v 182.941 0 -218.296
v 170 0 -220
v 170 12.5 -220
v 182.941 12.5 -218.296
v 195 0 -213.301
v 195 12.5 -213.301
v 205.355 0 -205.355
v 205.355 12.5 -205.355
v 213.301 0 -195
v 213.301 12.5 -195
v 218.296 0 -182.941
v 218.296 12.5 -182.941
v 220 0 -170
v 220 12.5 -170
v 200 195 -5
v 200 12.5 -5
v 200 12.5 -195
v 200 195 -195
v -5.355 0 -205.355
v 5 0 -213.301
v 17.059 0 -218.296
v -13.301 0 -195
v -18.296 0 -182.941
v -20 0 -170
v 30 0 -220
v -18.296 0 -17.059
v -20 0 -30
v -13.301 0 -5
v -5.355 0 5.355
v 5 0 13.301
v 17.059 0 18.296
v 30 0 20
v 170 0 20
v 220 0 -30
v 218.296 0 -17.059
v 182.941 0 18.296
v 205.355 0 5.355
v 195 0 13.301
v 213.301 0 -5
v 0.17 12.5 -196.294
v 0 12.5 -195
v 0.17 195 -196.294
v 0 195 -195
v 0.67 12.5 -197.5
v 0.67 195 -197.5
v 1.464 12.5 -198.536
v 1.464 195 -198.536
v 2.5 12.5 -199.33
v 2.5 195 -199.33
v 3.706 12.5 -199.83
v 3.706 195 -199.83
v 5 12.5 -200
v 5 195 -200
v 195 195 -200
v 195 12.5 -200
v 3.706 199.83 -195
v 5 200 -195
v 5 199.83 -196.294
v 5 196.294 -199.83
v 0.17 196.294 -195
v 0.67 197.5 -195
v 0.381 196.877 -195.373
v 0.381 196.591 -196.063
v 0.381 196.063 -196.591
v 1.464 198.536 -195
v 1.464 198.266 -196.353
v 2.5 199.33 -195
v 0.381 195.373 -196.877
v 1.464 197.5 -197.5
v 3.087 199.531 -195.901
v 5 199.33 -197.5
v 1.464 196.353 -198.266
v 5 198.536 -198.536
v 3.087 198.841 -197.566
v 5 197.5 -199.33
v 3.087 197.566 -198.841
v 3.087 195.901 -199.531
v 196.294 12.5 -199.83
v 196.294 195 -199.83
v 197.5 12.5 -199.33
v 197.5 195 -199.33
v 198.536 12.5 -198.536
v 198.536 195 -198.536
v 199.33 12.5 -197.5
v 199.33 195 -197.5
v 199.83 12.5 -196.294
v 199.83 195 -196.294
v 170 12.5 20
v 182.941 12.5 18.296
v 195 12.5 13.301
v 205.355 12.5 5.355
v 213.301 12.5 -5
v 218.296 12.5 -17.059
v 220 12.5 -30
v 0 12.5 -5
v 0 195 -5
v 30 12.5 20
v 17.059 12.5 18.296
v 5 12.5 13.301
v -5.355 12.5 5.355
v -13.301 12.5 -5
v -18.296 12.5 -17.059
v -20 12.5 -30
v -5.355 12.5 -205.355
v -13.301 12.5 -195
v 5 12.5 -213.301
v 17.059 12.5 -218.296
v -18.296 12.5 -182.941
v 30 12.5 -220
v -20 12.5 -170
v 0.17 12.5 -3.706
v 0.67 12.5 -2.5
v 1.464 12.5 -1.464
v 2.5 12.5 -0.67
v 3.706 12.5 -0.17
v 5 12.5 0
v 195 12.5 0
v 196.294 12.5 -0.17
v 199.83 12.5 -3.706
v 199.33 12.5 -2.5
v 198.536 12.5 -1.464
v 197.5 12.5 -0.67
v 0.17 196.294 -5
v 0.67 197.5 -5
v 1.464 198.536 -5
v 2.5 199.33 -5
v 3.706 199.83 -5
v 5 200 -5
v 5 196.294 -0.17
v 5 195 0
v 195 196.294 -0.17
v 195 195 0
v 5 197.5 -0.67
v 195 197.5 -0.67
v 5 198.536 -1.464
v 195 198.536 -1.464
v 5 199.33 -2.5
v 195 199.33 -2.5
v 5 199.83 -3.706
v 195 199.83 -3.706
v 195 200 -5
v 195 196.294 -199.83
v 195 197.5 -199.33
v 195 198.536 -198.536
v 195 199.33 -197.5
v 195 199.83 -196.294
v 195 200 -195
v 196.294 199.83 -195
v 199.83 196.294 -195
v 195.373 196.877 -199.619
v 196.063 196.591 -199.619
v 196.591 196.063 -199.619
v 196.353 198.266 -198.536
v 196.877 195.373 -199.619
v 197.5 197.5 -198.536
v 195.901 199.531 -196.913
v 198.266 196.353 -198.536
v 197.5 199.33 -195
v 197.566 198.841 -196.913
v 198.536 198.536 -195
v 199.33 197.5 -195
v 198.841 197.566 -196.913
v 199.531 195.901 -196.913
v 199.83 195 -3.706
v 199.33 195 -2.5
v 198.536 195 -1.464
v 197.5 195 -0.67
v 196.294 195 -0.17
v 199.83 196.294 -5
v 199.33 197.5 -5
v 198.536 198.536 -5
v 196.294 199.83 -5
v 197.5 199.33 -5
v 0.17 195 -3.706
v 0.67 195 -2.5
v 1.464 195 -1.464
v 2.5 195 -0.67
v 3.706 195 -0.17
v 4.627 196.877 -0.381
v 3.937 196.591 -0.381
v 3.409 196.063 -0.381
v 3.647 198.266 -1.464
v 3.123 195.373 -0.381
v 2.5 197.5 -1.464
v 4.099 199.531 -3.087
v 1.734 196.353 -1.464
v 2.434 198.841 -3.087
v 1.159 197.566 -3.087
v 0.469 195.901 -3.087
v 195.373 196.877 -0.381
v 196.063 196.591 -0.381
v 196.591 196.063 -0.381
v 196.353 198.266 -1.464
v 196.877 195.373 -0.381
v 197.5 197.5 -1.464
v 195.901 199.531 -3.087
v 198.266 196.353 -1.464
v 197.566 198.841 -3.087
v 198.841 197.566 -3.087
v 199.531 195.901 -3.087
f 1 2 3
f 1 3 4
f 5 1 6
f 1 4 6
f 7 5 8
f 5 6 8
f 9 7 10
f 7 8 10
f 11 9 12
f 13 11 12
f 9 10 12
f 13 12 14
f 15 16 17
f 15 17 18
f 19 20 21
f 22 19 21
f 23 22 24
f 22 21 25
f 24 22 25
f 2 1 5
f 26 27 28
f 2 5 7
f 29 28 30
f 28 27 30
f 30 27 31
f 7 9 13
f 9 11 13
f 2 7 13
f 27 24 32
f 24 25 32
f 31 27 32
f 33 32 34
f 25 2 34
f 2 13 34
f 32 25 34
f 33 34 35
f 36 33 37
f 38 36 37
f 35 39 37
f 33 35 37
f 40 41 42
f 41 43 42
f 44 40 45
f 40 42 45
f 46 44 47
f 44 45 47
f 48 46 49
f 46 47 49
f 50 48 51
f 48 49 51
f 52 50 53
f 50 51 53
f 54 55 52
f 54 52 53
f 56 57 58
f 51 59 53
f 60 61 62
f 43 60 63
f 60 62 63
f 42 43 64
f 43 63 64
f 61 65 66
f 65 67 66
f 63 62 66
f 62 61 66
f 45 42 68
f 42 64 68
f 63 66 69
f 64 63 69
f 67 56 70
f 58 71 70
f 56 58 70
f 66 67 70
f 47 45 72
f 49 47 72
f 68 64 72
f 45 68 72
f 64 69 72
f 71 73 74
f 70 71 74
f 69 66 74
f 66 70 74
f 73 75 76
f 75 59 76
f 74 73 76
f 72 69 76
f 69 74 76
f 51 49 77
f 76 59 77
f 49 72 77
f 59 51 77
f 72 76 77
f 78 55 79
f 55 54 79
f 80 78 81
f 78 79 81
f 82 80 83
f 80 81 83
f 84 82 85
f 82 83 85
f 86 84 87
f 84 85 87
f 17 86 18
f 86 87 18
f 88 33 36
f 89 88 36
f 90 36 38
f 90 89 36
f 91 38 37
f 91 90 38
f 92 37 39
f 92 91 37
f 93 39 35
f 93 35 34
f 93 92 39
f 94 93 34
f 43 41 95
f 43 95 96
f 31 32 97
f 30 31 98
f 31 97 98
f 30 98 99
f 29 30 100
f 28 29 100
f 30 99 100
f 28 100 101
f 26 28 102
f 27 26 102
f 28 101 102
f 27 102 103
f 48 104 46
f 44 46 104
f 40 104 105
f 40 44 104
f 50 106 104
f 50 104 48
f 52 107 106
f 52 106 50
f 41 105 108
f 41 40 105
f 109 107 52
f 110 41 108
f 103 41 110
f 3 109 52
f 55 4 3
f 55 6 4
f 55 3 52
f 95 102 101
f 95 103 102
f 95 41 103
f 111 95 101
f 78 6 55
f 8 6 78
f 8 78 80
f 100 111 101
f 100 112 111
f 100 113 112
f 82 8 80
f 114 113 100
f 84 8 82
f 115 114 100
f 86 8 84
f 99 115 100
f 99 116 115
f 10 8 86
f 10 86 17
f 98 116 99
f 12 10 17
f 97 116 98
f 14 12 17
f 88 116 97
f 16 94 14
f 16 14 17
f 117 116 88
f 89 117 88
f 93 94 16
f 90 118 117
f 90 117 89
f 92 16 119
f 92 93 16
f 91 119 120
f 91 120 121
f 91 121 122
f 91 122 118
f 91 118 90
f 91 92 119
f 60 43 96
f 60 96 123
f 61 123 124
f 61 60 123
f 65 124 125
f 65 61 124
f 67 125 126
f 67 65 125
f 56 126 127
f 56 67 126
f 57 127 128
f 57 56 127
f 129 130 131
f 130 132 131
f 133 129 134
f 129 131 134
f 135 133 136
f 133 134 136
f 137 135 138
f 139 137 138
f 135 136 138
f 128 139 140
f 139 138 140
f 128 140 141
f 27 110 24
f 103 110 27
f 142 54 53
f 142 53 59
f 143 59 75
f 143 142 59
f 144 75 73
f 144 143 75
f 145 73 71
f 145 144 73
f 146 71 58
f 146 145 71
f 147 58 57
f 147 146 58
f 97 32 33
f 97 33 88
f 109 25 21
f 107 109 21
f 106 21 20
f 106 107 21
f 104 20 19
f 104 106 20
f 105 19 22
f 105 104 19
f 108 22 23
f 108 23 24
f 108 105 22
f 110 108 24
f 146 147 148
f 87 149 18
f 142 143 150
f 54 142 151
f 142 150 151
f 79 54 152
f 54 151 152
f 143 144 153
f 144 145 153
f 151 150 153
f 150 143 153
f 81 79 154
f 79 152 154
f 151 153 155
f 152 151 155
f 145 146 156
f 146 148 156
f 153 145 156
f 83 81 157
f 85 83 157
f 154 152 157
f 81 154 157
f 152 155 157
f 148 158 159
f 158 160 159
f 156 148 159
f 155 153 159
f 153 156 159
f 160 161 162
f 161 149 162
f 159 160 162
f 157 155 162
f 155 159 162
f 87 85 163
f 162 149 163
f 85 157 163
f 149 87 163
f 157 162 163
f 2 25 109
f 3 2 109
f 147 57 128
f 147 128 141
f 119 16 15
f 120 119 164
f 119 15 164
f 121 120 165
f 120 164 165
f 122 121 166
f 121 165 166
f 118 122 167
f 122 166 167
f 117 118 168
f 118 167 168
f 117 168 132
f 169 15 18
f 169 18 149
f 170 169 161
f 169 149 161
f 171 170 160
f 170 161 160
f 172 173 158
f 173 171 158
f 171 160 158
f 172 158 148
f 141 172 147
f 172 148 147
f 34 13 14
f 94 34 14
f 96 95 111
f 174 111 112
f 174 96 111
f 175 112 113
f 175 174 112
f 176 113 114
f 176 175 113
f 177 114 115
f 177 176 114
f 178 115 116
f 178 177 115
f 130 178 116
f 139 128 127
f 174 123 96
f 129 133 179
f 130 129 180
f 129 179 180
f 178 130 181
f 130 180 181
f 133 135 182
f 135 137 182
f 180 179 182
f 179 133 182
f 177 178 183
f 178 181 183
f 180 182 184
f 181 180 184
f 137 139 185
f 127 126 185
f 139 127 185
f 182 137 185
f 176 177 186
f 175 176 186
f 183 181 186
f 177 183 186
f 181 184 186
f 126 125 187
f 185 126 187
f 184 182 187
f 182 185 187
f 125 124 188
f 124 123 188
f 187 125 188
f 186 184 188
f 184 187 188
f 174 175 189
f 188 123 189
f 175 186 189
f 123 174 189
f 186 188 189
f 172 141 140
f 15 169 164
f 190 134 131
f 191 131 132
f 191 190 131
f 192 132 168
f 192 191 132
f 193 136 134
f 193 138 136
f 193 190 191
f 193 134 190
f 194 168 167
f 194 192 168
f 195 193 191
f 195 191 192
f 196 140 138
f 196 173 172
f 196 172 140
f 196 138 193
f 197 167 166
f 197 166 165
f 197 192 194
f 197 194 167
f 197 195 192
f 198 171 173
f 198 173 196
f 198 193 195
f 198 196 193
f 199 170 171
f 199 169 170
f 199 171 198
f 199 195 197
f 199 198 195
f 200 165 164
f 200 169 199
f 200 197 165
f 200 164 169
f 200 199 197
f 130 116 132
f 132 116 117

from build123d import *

# Parameters (mm, degrees)
SKETCH1_W           = 200
SKETCH1_H           = 200
BOSS_EXTRUDE1_DEPTH = 200
SKETCH3_W           = 200
SKETCH3_H           = 12.5
BOSS_EXTRUDE2_DEPTH = 20
SKETCH4_W           = 220
SKETCH4_H           = 12.5
BOSS_EXTRUDE3_DEPTH = 20
SKETCH5_W           = 220
SKETCH5_H           = 12.5
BOSS_EXTRUDE4_DEPTH = 20
SKETCH6_W           = 240
SKETCH6_H           = 12.5
BOSS_EXTRUDE5_DEPTH = 20
FILLET1_R           = 50
FILLET2_R           = 5


with BuildPart() as part:
    # Sketch1 → Boss-Extrude1 (new body)
    with BuildSketch(Plane(origin=(0, 0, 0), x_dir=(1, 0, 0), z_dir=(0, 1, 0))):
        with Locations((100, 100)):
            Rectangle(SKETCH1_W, SKETCH1_H)
    extrude(amount=BOSS_EXTRUDE1_DEPTH)

    # Sketch3 → Boss-Extrude2 (add)
    with BuildSketch(Plane.XY):
        with Locations((100, 6.25)):
            Rectangle(SKETCH3_W, SKETCH3_H)
    extrude(amount=BOSS_EXTRUDE2_DEPTH)

    # Sketch4 → Boss-Extrude3 (add)
    with BuildSketch(Plane(origin=(200, 0, 0), x_dir=(0, 0, -1), z_dir=(1, 0, 0))):
        with Locations((90, 6.25)):
            Rectangle(SKETCH4_W, SKETCH4_H)
    extrude(amount=BOSS_EXTRUDE3_DEPTH)

    # Sketch5 → Boss-Extrude4 (add)
    with BuildSketch(Plane(origin=(0, 0, -200), x_dir=(-1, 0, 0), z_dir=(0, 0, -1))):
        with Locations((-110, 6.25)):
            Rectangle(SKETCH5_W, SKETCH5_H)
    extrude(amount=BOSS_EXTRUDE4_DEPTH)

    # Sketch6 → Boss-Extrude5 (add)
    with BuildSketch(Plane.ZY):
        with Locations((-100, 6.25)):
            Rectangle(SKETCH6_W, SKETCH6_H)
    extrude(amount=BOSS_EXTRUDE5_DEPTH)

    # Fillet1
    fillet1_edges = [part.edges().sort_by_distance(p)[0] for p in [
        (220, 6.25, 20),
        (220, 6.25, -220),
        (-20, 6.25, -220),
        (-20, 6.25, 20),
    ]]
    fillet(fillet1_edges, radius=FILLET1_R)

    # Fillet2
    fillet2_edges = [part.edges().sort_by_distance(p)[0] for p in [
        (200, 200, -100),
        (100, 200, -200),
        (0, 200, -100),
        (100, 200, 0),
        (0, 106.25, -200),
        (200, 106.25, -200),
        (200, 106.25, 0),
        (0, 106.25, 0),
    ]]
    fillet(fillet2_edges, radius=FILLET2_R)


solid = part.part
